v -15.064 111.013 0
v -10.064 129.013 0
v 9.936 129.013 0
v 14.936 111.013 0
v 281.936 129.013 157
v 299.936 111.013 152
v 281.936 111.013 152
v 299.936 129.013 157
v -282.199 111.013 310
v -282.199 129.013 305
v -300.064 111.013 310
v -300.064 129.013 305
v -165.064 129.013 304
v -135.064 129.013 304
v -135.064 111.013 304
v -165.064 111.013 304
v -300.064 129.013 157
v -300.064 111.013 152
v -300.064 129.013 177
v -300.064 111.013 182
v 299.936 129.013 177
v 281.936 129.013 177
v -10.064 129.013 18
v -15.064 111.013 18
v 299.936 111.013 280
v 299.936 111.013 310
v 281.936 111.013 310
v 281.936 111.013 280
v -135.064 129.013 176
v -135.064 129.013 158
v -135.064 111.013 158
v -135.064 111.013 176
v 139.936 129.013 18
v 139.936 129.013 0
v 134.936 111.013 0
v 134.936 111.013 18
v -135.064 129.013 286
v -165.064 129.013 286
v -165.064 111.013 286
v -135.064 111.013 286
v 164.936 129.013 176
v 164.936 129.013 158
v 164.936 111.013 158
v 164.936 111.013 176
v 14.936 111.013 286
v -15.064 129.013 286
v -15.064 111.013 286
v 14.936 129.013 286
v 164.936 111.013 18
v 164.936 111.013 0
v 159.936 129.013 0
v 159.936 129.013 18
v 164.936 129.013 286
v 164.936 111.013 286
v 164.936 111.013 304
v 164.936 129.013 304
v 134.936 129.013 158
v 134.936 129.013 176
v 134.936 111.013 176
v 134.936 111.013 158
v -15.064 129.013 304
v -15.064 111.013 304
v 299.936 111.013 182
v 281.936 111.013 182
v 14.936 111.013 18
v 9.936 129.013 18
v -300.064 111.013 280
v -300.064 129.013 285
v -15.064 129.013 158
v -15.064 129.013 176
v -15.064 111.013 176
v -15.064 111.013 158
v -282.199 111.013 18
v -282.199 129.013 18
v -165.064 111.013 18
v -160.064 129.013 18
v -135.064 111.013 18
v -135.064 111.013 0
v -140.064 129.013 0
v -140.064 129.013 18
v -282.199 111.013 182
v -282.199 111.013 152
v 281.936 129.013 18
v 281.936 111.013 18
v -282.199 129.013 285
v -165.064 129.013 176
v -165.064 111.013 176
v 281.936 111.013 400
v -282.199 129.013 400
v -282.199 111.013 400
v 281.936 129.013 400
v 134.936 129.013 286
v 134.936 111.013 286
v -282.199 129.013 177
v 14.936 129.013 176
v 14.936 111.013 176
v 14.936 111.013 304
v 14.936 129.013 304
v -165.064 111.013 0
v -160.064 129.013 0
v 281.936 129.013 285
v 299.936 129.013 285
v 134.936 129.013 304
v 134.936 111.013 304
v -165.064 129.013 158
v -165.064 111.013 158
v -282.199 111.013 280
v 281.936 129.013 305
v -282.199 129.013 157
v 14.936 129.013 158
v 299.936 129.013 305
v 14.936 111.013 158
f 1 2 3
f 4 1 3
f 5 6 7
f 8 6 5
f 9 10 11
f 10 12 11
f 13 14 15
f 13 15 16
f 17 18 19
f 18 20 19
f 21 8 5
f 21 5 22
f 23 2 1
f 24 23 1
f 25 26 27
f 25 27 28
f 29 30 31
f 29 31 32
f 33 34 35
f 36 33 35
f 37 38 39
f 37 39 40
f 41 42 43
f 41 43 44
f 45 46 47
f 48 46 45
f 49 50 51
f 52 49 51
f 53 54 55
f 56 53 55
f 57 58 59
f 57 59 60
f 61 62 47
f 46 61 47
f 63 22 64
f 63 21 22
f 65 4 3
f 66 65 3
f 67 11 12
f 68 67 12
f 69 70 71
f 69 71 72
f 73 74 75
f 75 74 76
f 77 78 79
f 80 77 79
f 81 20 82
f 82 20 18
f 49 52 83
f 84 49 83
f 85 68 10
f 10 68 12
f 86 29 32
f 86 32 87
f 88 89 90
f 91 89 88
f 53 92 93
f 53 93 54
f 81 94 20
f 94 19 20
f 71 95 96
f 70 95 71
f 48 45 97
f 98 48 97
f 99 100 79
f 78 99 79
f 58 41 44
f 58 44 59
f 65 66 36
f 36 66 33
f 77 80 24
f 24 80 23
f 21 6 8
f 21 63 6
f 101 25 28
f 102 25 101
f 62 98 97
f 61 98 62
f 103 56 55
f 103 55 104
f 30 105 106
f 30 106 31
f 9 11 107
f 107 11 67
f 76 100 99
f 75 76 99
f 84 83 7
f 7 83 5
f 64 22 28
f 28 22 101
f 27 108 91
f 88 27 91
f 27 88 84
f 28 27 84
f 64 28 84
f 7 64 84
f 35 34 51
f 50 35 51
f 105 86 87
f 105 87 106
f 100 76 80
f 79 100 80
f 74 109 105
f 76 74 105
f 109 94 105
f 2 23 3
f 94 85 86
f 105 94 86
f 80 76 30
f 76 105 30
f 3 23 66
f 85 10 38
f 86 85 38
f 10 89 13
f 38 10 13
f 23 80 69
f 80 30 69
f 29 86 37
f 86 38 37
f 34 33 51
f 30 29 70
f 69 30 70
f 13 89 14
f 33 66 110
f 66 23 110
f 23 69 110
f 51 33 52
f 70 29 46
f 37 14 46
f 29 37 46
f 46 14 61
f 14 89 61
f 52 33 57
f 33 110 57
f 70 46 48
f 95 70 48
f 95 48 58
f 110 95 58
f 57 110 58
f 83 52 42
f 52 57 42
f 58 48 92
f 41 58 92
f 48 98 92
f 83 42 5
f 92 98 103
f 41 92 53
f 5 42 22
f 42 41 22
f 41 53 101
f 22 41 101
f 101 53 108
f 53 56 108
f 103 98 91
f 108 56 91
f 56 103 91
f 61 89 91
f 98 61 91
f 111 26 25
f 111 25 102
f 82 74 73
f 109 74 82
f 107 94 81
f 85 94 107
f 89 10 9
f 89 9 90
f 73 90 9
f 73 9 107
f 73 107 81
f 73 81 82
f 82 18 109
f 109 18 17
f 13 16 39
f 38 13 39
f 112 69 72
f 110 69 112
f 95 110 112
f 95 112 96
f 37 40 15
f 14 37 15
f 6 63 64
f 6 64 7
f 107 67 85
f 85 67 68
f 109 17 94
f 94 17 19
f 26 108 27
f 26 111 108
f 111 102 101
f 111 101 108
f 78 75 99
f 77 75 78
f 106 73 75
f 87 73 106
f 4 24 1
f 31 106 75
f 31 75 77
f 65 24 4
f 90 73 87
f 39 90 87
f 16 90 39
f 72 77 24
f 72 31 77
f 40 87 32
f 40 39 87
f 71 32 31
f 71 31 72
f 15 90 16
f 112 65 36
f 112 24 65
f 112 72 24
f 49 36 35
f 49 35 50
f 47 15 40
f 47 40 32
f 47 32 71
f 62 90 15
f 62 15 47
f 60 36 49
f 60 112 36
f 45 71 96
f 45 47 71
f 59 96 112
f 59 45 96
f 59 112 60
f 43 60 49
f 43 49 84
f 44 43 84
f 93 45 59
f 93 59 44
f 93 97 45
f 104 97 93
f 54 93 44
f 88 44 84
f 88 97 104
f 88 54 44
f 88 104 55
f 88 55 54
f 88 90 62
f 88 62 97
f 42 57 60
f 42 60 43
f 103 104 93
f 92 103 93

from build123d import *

# Parameters (mm, degrees)
F4_W      = 564.1347765923
F4_H      = 381.999976933
F5_DEPTH  = 18
F6_DEPTH  = 17.9999992251
F7_DEPTH  = 18.0000689332
F10_DEPTH = 17.8651544745
F12_DEPTH = 25


with BuildPart() as f5:
    # F4 (on plane+point) → F5 (new body)
    with BuildSketch(Plane.XZ.offset(-129.0130399809)):
        with Locations((-0.1316666603, 208.9999876916)):
            Rectangle(F4_W, F4_H)
    extrude(amount=F5_DEPTH)

    # F0 (on Top) → F6 (join, through all)
    with BuildSketch(Plane.XY):
        Polygon((149.935790569, 129.0130399809), (139.935790569, 129.0130399809), (134.935790569, 111.0130399809), (164.935790569, 111.0130399809), (159.935790569, 129.0130399809), align=None)
        Polygon((-0.064209431, 129.0130399809), (-10.064209431, 129.0130399809), (-15.064209431, 111.0130399809), (-0.064209431, 111.0130399809), (14.935790569, 111.0130399809), (9.935790569, 129.0130399809), align=None)
        Polygon((-150.064209431, 129.0130399809), (-160.064209431, 129.0130399809), (-165.064209431, 111.0130399809), (-135.064209431, 111.0130399809), (-140.064209431, 129.0130399809), align=None)
    extrude(amount=F6_DEPTH)

    # F3 (on plane+point) → F7 (join, through all)
    with BuildSketch(Plane.YZ.offset(299.935790569)):
        Polygon((111.0131509304, 152), (129.0131509304, 157), (129.0131509304, 177), (111.0131509304, 182), align=None)
        Polygon((129.0131509304, 295), (129.0131509304, 305), (111.0131509304, 310), (111.0131509304, 295), (111.0131509304, 280), (129.0131509304, 285), align=None)
    extrude(amount=-F7_DEPTH)

    # F9 (on offset) → F10 (join, through all)
    with BuildSketch(Plane.YZ.offset(-300.064209431)):
        Polygon((129.0131062269, 295), (129.0131062269, 305), (111.0131062269, 310), (111.0131062269, 295), (111.0131062269, 280), (129.0131062269, 285), align=None)
        Polygon((111.0131062269, 152), (129.0131062269, 157), (129.0131062269, 177), (111.0131062269, 182), align=None)
    extrude(amount=F10_DEPTH)

    # F11 (on plane+point) → F12 (cut)
    with BuildSketch(Plane.XZ.offset(-129.0130399809)):
        Polygon((164.9357974529, 167), (164.9357974529, 175.9999990463), (149.935790569, 175.9999990463), (134.9357962608, 175.9999990463), (134.9357962608, 167), (134.9357962608, 158.0000072718), (149.935790569, 158.0000072718), (164.9357974529, 158.0000072718), align=None)
        Polygon((149.935790569, 286.0000133514), (164.9357974529, 286.0000133514), (164.9357974529, 295), (164.9357974529, 303.9999902248), (149.935790569, 303.9999902248), (134.9357962608, 303.9999902248), (134.9357962608, 295), (134.9357962608, 286.0000133514), align=None)
        Polygon((14.9357905611, 167), (14.9357905611, 175.9999990463), (-15.0642096996, 175.9999990463), (-15.0642096996, 167), (-15.0642096996, 158.0000072718), (14.9357905611, 158.0000072718), align=None)
        Polygon((-15.0642096996, 286.0000133514), (14.9357905611, 286.0000133514), (14.9357905611, 295), (14.9357905611, 303.9999902248), (-15.0642096996, 303.9999902248), (-15.0642096996, 295), align=None)
        Polygon((-135.064214468, 167), (-135.064214468, 175.9999990463), (-165.0642156601, 175.9999990463), (-165.0642156601, 167), (-165.0642156601, 158.0000072718), (-135.064214468, 158.0000072718), align=None)
        Polygon((-165.0642156601, 286.0000133514), (-135.064214468, 286.0000133514), (-135.064214468, 295), (-135.064214468, 303.9999902248), (-165.0642156601, 303.9999902248), (-165.0642156601, 295), align=None)
    extrude(amount=F12_DEPTH, mode=Mode.SUBTRACT)


solid = f5.part
